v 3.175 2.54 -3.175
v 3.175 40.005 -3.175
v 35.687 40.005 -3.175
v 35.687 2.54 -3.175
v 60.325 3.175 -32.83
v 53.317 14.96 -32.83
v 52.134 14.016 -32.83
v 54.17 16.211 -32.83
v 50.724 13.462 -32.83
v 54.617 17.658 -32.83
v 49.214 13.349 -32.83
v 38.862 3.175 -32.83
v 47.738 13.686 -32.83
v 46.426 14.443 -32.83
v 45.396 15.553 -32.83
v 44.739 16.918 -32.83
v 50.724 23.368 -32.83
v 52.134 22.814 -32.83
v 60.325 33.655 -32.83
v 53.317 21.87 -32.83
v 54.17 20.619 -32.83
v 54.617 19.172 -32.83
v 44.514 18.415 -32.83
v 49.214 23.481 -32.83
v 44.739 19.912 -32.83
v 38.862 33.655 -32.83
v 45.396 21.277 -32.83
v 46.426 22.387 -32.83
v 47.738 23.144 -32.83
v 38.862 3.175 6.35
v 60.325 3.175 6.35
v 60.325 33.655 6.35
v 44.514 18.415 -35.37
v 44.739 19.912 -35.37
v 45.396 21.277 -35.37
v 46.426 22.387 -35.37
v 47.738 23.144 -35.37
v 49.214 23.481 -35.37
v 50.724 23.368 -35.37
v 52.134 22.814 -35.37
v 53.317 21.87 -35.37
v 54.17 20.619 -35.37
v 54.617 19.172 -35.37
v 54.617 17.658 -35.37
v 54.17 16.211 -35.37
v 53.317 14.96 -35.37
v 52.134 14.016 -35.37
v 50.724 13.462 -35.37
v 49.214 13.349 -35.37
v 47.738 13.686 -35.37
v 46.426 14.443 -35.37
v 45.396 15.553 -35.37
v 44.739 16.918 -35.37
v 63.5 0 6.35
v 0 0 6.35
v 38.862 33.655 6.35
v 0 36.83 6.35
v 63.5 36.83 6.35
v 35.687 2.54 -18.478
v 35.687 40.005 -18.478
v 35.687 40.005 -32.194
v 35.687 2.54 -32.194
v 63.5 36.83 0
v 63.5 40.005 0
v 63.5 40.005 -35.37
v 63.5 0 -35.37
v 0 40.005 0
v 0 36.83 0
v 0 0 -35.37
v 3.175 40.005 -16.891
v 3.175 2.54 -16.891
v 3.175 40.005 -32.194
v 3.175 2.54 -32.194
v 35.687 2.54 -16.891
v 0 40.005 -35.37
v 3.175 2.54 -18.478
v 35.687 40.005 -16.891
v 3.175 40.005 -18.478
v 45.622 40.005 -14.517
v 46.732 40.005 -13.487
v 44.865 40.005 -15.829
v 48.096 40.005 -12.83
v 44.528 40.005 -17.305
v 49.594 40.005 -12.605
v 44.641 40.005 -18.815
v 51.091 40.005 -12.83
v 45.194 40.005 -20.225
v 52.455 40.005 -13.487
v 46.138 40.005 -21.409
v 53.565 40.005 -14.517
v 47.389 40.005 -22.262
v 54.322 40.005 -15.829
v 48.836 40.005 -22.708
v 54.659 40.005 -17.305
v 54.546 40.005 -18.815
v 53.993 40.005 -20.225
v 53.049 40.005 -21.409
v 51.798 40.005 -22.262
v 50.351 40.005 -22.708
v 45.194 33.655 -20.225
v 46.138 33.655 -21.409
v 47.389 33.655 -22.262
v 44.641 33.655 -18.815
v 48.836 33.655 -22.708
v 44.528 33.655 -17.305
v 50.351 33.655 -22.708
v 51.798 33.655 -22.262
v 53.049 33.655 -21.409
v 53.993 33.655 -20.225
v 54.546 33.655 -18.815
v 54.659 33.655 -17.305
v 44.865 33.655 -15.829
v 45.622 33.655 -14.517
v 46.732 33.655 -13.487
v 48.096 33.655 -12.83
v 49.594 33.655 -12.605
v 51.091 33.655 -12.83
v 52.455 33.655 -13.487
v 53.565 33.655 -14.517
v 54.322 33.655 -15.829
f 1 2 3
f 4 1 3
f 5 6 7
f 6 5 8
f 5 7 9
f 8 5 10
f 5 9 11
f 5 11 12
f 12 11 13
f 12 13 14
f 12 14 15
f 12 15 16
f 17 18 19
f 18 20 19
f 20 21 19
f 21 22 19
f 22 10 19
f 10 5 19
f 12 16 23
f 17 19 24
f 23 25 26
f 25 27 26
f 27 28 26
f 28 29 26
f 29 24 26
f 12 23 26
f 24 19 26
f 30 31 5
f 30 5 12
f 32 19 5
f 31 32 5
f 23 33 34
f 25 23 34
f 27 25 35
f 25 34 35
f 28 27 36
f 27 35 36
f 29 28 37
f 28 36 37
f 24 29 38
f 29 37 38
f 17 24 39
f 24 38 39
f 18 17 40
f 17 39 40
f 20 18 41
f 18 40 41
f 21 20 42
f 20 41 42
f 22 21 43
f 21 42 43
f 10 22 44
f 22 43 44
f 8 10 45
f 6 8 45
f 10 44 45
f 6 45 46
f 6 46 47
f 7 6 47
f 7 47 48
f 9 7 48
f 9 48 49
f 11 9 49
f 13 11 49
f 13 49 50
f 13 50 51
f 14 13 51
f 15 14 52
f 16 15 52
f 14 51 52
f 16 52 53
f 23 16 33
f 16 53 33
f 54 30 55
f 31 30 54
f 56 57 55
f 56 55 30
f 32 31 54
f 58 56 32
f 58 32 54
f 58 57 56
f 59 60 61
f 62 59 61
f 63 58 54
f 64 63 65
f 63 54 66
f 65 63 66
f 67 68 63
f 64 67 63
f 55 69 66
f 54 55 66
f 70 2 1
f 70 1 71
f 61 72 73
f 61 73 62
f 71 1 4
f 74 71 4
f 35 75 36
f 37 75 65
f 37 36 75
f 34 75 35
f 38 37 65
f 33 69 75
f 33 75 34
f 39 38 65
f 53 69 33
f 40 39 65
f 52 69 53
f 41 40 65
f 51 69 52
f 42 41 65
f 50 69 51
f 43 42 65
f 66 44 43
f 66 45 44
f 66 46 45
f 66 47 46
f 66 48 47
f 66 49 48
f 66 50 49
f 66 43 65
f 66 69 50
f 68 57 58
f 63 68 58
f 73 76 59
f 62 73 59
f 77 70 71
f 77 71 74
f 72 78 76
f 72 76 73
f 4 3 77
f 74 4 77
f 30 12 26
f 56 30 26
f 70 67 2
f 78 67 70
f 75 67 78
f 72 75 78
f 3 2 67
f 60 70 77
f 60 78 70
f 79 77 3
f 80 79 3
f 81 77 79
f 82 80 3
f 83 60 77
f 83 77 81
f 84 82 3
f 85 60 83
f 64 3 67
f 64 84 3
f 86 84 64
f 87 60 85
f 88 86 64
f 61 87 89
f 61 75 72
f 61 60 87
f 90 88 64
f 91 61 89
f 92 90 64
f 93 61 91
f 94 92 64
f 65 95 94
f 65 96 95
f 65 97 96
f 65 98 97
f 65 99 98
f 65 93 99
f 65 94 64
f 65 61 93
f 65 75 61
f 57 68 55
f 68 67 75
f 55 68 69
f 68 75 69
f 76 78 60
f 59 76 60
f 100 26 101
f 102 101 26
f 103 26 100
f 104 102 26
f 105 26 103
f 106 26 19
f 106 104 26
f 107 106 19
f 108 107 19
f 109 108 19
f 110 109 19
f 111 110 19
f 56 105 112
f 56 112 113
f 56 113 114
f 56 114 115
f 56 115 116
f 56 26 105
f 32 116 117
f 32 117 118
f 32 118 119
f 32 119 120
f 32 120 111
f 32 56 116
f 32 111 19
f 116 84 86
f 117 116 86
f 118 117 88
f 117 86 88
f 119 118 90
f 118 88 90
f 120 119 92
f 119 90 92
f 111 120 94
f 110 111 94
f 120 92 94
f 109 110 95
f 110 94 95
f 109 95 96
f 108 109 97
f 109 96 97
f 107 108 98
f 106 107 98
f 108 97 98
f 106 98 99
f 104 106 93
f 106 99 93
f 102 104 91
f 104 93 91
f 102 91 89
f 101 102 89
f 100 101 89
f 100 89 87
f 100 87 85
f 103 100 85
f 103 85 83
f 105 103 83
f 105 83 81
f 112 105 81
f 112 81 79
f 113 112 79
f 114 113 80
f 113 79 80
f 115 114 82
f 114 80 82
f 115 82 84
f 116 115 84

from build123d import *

# Parameters (mm, degrees)
SKETCH1_W            = 63.5
SKETCH1_H            = 44.45
SKETCH1_W_2          = 32.512
SKETCH1_H_2          = 13.716
BOSS_EXTRUDE1_DEPTH  = 40.005
SKETCH2_W            = 32.512
SKETCH2_H            = 13.716
BOSS_EXTRUDE2_DEPTH  = 2.54
CUT_EXTRUDE1_DEPTH   = 36.83
BOSS_EXTRUDE8_DEPTH  = 6.35
BOSS_EXTRUDE9_REACH  = 92.627
SKETCH10_W           = 21.463
SKETCH10_H           = 3.175
SKETCH11_W           = 9.0805
SKETCH11_H           = 36.83
CUT_EXTRUDE2_DEPTH   = 88.226443955
SKETCH12_W           = 21.463
SKETCH12_H           = 30.48
SKETCH12_R           = 5.08
BOSS_EXTRUDE10_DEPTH = 2.54
SKETCH13_W           = 24.638
SKETCH13_H           = 35.3695
BOSS_EXTRUDE11_DEPTH = 3.175
SKETCH14_R           = 5.08
CUT_EXTRUDE3_DEPTH   = 6.35


with BuildPart() as part:
    # Sketch1 → Boss-Extrude1 (new body)
    with BuildSketch(Plane(origin=(0, 0, 0), x_dir=(1, 0, 0), z_dir=(0, 1, 0))):
        with Locations((31.75, 22.225)):
            Rectangle(SKETCH1_W, SKETCH1_H)
        with Locations((19.431, 25.3365)):
            Rectangle(SKETCH1_W_2, SKETCH1_H_2, mode=Mode.SUBTRACT)
        with Locations((19.431, 10.033)):
            Rectangle(SKETCH1_W_2, SKETCH1_H_2, mode=Mode.SUBTRACT)
    extrude(amount=BOSS_EXTRUDE1_DEPTH)

    # Sketch2 → Boss-Extrude2 (add)
    with BuildSketch(Plane.XZ):
        with Locations((19.431, -10.033)):
            Rectangle(SKETCH2_W, SKETCH2_H)
        with Locations((19.431, -25.3365)):
            Rectangle(SKETCH2_W, SKETCH2_H)
    extrude(amount=-BOSS_EXTRUDE2_DEPTH)

    # Sketch3 → Cut-Extrude1 (cut)
    with BuildSketch(Plane(origin=(0, 40.005, 0), x_dir=(1, 0, 0), z_dir=(0, 1, 0))):
        Polygon((3.175, 35.3695), (35.687, 35.3695), (38.862, 35.3695), (38.862, 32.1945), (38.862, 18.4785), (38.862, 0), (63.5, 0), (63.5, 44.45), (0, 44.45), (0, 35.3695), align=None)
    extrude(amount=-CUT_EXTRUDE1_DEPTH, mode=Mode.SUBTRACT)

    # Sketch9 → Boss-Extrude8 (add)
    with BuildSketch(Plane.XY):
        Polygon((38.862, 36.83), (0, 36.83), (0, 0), (63.5, 0), (63.5, 3.175), (38.862, 3.175), align=None)
    extrude(amount=BOSS_EXTRUDE8_DEPTH)

    # Boss-Extrude9: up to this face of the body (flat: up to its plane)
    boss_extrude9_end = Plane(part.part.faces().sort_by_distance((31.75, 1.5875, -44.45))[0])
    # Sketch10 → Boss-Extrude9 (add, up to the picked face)
    with BuildSketch(Plane.XY.offset(6.35), mode=Mode.PRIVATE) as boss_extrude9_sk1:
        Polygon((60.325, 3.175), (63.5, 3.175), (63.5, 36.83), (60.325, 36.83), (60.325, 33.655), (60.325, 30.48), align=None)
    boss_extrude9_tool1 = split(extrude(boss_extrude9_sk1.sketch, amount=-BOSS_EXTRUDE9_REACH, mode=Mode.PRIVATE), bisect_by=boss_extrude9_end, keep=Keep.BOTH, mode=Mode.PRIVATE)
    # Sketch10 → Boss-Extrude9 (add, up to the picked face)
    with BuildSketch(Plane.XY.offset(6.35), mode=Mode.PRIVATE) as boss_extrude9_sk2:
        with Locations((49.5935, 35.2425)):
            Rectangle(SKETCH10_W, SKETCH10_H)
    boss_extrude9_tool2 = split(extrude(boss_extrude9_sk2.sketch, amount=-BOSS_EXTRUDE9_REACH, mode=Mode.PRIVATE), bisect_by=boss_extrude9_end, keep=Keep.BOTH, mode=Mode.PRIVATE)
    add(boss_extrude9_tool1.solids().sort_by(Axis((61.9125, 20.0025, 6.35), (0, 0, -1)))[0])
    add(boss_extrude9_tool2.solids().sort_by(Axis((49.5935, 35.2425, 6.35), (0, 0, -1)))[0])

    # Sketch11 → Cut-Extrude2 (cut, through all)
    with BuildSketch(Plane.ZY):
        with Locations((-39.90975, 18.415)):
            Rectangle(SKETCH11_W, SKETCH11_H)
    extrude(amount=-CUT_EXTRUDE2_DEPTH, mode=Mode.SUBTRACT)

    # Sketch12 → Boss-Extrude10 (add)
    with BuildSketch(Plane(origin=(0, 0, -35.3695), x_dir=(-1, 0, 0), z_dir=(0, 0, -1))):
        with Locations((-49.5935, 18.415)):
            Rectangle(SKETCH12_W, SKETCH12_H)
        with Locations((-49.5935, 18.415)):
            Circle(SKETCH12_R, mode=Mode.SUBTRACT)
    extrude(amount=-BOSS_EXTRUDE10_DEPTH)

    # Sketch13 → Boss-Extrude11 (add)
    with BuildSketch(Plane(origin=(0, 36.83, 0), x_dir=(1, 0, 0), z_dir=(0, 1, 0))):
        with Locations((51.181, 17.68475)):
            Rectangle(SKETCH13_W, SKETCH13_H)
    extrude(amount=BOSS_EXTRUDE11_DEPTH)

    # Sketch14 → Cut-Extrude3 (cut)
    with BuildSketch(Plane(origin=(0, 40.005, 0), x_dir=(1, 0, 0), z_dir=(0, 1, 0))):
        with Locations(Location((49.5935, 17.68475, 0), (0, 0, 270))):
            Circle(SKETCH14_R)
    extrude(amount=-CUT_EXTRUDE3_DEPTH, mode=Mode.SUBTRACT)


solid = part.part
